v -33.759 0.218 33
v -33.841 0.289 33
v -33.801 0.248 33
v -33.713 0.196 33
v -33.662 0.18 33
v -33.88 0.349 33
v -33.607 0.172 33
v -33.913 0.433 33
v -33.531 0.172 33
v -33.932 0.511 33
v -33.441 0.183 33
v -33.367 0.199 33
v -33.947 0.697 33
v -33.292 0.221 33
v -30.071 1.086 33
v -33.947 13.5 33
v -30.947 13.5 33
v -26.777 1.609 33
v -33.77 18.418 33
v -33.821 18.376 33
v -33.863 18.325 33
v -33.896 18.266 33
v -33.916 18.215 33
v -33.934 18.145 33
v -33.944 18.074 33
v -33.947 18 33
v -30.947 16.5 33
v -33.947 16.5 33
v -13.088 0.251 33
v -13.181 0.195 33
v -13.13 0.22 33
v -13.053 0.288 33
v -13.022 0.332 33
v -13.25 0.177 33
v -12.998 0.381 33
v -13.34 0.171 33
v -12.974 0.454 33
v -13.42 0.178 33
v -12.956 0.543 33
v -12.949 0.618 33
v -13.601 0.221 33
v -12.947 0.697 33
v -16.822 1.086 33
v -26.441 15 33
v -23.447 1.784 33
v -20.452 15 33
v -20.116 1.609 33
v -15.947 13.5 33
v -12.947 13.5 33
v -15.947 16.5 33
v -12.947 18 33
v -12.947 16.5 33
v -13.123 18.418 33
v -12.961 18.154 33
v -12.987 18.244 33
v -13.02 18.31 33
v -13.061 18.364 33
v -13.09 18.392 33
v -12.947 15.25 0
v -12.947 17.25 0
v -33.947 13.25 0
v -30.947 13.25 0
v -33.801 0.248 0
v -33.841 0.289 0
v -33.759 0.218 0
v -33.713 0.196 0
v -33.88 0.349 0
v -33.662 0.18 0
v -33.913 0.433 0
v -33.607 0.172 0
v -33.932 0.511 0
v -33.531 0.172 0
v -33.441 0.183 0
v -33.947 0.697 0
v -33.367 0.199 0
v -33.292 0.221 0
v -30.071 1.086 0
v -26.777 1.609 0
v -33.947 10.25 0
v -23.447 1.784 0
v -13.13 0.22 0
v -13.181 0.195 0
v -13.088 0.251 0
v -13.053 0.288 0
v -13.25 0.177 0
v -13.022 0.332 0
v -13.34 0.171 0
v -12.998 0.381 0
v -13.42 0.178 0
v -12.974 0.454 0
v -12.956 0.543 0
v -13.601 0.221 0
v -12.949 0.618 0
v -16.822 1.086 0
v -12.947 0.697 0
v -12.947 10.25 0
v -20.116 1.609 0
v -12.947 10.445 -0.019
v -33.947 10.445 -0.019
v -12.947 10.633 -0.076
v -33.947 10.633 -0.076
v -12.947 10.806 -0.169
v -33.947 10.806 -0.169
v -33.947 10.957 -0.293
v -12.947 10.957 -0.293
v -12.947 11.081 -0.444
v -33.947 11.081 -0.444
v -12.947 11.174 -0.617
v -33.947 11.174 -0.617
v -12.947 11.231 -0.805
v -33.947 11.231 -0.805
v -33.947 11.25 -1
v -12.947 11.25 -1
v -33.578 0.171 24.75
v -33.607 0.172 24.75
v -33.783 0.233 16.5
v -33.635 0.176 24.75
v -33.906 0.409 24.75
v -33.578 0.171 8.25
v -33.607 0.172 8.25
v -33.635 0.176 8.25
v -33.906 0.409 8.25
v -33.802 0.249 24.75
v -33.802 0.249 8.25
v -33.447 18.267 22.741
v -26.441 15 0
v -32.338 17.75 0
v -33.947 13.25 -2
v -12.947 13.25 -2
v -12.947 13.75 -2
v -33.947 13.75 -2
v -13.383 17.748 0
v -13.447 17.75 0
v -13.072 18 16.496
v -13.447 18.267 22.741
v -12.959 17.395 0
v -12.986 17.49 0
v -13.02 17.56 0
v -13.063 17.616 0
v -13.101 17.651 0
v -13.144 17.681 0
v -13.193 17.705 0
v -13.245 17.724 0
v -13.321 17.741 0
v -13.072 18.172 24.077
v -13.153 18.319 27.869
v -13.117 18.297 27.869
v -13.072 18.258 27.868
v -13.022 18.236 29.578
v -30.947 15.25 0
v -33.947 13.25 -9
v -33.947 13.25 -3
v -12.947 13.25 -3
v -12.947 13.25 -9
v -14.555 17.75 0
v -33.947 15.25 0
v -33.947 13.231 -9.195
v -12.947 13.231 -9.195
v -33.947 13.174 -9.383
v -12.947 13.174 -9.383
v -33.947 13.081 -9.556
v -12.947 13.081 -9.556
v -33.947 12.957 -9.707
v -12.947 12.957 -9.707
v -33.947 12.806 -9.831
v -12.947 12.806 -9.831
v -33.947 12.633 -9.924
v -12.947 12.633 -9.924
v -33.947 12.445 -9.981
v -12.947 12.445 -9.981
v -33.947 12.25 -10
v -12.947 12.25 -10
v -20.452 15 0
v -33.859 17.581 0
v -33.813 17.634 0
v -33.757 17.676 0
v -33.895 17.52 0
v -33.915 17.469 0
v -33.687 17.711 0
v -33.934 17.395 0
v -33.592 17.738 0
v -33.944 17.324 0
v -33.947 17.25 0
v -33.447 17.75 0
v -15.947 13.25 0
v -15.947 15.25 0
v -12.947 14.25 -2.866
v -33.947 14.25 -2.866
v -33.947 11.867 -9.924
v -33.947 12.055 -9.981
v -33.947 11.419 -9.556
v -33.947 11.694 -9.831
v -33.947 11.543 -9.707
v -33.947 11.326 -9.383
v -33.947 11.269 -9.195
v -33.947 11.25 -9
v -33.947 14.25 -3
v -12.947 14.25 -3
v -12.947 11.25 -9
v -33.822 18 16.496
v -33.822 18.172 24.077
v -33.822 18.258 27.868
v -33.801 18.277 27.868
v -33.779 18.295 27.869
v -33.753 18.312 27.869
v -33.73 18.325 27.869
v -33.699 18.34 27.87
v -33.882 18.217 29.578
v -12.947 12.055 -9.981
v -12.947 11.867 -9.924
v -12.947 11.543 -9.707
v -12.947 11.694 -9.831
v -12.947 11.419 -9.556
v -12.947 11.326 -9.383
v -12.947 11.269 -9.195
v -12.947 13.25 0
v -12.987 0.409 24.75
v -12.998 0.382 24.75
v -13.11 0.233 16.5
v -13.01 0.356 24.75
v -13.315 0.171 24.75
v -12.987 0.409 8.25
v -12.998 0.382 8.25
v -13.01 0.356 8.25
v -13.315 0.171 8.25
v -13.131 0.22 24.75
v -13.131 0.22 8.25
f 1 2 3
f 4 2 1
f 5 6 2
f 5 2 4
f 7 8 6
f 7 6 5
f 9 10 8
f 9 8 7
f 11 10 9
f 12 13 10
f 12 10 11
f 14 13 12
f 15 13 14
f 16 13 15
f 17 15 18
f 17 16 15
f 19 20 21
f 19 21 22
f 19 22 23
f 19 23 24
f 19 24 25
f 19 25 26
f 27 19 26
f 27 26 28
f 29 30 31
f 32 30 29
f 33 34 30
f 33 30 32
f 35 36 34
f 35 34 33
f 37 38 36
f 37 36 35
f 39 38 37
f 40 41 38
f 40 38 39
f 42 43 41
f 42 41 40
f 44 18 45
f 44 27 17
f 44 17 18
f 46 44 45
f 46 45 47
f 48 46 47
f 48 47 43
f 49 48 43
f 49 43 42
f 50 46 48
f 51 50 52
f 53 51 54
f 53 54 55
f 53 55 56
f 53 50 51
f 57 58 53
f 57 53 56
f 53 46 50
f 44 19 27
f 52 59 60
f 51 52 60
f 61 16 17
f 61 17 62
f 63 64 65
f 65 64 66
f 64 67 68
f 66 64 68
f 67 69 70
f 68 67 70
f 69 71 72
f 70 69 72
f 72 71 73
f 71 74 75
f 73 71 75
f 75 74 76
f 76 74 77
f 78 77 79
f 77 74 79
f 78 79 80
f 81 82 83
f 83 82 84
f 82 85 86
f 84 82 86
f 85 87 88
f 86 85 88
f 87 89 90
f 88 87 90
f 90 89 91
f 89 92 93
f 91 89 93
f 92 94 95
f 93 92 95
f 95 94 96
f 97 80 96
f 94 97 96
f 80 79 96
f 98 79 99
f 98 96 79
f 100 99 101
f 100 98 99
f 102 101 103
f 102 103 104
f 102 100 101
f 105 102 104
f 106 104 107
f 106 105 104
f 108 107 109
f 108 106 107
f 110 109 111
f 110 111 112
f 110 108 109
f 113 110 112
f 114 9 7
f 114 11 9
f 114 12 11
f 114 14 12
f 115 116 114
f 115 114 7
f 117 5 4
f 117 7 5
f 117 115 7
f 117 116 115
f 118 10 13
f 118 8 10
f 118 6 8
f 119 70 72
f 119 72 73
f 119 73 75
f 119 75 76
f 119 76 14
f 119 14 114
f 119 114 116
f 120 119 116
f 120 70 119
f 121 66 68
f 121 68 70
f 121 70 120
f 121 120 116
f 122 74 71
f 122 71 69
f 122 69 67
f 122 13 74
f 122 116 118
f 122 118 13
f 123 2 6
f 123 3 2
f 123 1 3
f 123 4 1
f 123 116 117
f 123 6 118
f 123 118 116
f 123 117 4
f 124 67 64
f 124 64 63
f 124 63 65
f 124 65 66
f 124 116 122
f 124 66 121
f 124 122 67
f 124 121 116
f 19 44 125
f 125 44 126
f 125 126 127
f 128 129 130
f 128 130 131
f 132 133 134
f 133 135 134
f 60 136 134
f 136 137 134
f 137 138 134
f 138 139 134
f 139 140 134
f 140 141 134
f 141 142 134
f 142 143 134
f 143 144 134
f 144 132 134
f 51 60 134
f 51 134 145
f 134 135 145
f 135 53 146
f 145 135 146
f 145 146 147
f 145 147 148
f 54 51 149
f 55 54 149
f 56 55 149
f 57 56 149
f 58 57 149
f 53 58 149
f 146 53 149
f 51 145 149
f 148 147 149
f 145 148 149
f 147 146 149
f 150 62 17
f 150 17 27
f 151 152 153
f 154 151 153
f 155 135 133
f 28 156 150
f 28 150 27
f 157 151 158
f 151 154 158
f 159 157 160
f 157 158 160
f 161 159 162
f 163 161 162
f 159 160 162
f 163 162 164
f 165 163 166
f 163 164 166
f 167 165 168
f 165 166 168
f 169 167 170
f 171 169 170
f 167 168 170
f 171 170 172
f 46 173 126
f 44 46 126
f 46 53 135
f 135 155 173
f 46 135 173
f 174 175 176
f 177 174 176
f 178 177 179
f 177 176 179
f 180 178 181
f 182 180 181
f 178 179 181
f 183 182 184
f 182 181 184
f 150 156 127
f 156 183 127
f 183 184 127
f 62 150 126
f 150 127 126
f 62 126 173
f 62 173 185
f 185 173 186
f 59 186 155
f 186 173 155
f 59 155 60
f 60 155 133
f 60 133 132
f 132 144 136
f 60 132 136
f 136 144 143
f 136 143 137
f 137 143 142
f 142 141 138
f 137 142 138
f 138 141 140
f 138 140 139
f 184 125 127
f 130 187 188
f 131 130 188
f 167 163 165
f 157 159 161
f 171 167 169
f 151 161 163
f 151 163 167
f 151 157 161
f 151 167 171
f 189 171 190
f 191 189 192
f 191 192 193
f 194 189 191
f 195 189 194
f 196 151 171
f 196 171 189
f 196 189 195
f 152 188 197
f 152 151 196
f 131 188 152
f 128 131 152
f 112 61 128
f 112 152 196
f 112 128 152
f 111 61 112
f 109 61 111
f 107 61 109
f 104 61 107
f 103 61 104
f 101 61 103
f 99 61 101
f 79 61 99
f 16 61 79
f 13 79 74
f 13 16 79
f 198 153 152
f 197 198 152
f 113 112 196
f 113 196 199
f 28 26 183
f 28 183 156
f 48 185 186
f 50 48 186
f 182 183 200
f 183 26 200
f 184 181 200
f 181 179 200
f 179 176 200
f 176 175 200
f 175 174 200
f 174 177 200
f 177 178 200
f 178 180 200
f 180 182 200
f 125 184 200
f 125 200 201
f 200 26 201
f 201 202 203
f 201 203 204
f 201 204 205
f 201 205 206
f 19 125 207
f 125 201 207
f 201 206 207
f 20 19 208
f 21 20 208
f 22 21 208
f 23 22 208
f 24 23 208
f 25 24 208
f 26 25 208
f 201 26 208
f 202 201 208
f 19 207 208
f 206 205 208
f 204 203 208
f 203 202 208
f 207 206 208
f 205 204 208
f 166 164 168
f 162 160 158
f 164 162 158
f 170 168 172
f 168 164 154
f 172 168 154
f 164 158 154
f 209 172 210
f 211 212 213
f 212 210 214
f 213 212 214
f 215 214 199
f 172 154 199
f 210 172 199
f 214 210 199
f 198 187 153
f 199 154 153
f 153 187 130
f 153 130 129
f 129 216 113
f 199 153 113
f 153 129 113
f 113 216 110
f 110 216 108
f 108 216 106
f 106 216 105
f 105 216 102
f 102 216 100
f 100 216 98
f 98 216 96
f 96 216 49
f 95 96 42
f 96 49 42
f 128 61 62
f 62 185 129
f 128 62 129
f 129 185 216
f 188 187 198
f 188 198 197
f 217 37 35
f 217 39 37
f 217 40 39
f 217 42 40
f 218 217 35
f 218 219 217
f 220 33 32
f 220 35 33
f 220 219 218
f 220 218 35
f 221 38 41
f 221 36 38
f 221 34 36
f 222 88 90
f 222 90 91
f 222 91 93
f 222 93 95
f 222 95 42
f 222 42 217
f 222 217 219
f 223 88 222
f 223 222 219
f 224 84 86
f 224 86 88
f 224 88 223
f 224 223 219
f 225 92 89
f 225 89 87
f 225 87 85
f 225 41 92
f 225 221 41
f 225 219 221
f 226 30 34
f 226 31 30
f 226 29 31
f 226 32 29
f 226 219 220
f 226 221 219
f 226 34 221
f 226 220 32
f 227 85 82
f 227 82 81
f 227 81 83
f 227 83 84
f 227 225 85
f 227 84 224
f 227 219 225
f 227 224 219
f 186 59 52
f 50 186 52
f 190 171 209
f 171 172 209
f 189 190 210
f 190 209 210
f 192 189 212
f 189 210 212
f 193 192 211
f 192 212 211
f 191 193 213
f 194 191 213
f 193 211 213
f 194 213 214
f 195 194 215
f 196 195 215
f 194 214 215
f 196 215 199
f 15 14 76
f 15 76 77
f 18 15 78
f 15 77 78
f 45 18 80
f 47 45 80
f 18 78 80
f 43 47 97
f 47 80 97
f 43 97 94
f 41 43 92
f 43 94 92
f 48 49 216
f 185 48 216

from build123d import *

# Parameters (mm, degrees)
F1_DEPTH    = 33
F3_DEPTH    = 21.001
F4_DEPTH    = 3
F6_T1_DEPTH = 35.508521627
F6_T3_DEPTH = 36.4826554363
F7_W        = 21
F7_H        = 2
F8_DEPTH    = 10
F9_W        = 21
F9_H        = 1
F10_DEPTH   = 1
F11_SIZE2   = 0.8660254038
F11_SIZE    = 0.5
F12_R       = 0.99999


# Not quite as in the source:
# - a fillet or chamfer that OpenCascade refuses, or shapes differently, is made with other operations: its cross-section is extruded or revolved along the edge and cut away or added
# - a fillet or chamfer is up to 0.001 mm smaller than in the source, because OpenCascade refuses the exact size
# - a pattern or mirror of a feature is missing from the dataset's text; its kind, count and spacing are read off the source's solid


with BuildPart() as f1:
    # F0 (on Top) → F1 (new body)
    with BuildSketch(Plane.XY):
        Polygon((-33.9465141296, 18.5), (-33.9465141296, 15), (-26.4407399079, 15), align=None)
        Polygon((-20.4522883514, 15), (-12.9465141296, 15), (-12.9465141296, 18.5), align=None)
        with BuildLine():
            Line((-33.9465141296, 15), (-33.9465141296, 0))
            ThreePointArc((-33.9465141296, 0), (-23.4465141296, 1.783504535), (-12.9465141296, 0))
            Line((-12.9465141296, 0), (-12.9465141296, 15))
            Line((-12.9465141296, 15), (-20.4522883514, 15))
            Line((-20.4522883514, 15), (-26.4407399079, 15))
            Line((-26.4407399079, 15), (-33.9465141296, 15))
        make_face()
    extrude(amount=F1_DEPTH)

    # F2 (on face) → F3 (cut, through all)
    with BuildSketch(Plane.YZ.offset(-12.9465141296)):
        Polygon((18.5, 0), (18.5, 33), (17.75, 0), align=None)
    extrude(amount=-F3_DEPTH, mode=Mode.SUBTRACT)

    # F2 (on face) → F4 (cut)
    with BuildSketch(Plane.YZ.offset(-12.9465141296)):
        Polygon((15.25, 0), (16.5, 33), (13.5, 33), (13.25, 0), align=None)
    f4 = extrude(amount=-F4_DEPTH, mode=Mode.SUBTRACT)

    # F4_copies: F4 across plane
    add(f4.mirror(Plane(origin=(-23.446514, 0, 0), x_dir=(0, 0, -1), z_dir=(-1, 0, 0))), mode=Mode.SUBTRACT)

    # F6: fillet of radius 0.5 on 4 edges, made by hand

    # F6_s2 → F6_t1 (cut)
    with BuildSketch(Plane(origin=(0, 0.7875654118, 34.6528781205), x_dir=(1, 0, 0), z_dir=(0, -0.0227214054, -0.9997418355))):
        with BuildLine():
            add(Edge.make_bspline(
                [(-13.4465141296, -17.7454175809), (-12.9465141296, -17.7454175809), (-12.9465141296, -17.2454175809)],
                knots=[0, 0, 0, 1, 1, 1], degree=2, weights=[1, 1, 1]))
            Line((-12.9465141296, -17.2454175809), (-12.9465141296, -17.7454175809))
            Line((-12.9465141296, -17.7454175809), (-13.4465141296, -17.7454175809))
        make_face()
        with BuildLine():
            add(Edge.make_bspline(
                [(-33.9465141296, -17.2454175809), (-33.9465141296, -17.7454175809), (-33.4465141296, -17.7454175809)],
                knots=[0, 0, 0, 1, 1, 1], degree=2, weights=[1, 1, 1]))
            Line((-33.4465141296, -17.7454175809), (-33.9465141296, -17.7454175809))
            Line((-33.9465141296, -17.7454175809), (-33.9465141296, -17.2454175809))
        make_face()
    extrude(amount=F6_T1_DEPTH, mode=Mode.SUBTRACT)

    # F6_s4 → F6_t3 (cut)
    with BuildSketch(Plane.XY.offset(-1.7413277182)):
        with BuildLine():
            add(Edge.make_bspline(
                [(-33.291715368, 0.2210972397), (-33.9465141296, 0.0078982049), (-33.9465141296, 0.6965310873)],
                knots=[0, 0, 0, 1, 1, 1], degree=2, weights=[1, 1, 1]))
            Line((-33.9465141296, 0.6965310873), (-33.9465141296, 0))
            ThreePointArc((-33.9465141296, 0), (-33.6197154132, 0.1123275396), (-33.291715368, 0.2210972397))
        make_face()
        with BuildLine():
            add(Edge.make_bspline(
                [(-12.9465141296, 0.6965310873), (-12.9465141296, 0.0078982049), (-13.6013128912, 0.2210972397)],
                knots=[0, 0, 0, 1, 1, 1], degree=2, weights=[1, 1, 1]))
            ThreePointArc((-13.6013128912, 0.2210972397), (-13.2733128461, 0.1123275396), (-12.9465141296, 0))
            Line((-12.9465141296, 0), (-12.9465141296, 0.6965310873))
        make_face()
    extrude(amount=F6_T3_DEPTH, mode=Mode.SUBTRACT)

    # F7 (on face) → F8 (join)
    with BuildSketch(Plane(origin=(0, 0, 0), x_dir=(1, 0, 0), z_dir=(0, 0, -1))):
        with Locations((-23.4465141296, -12.25)):
            Rectangle(F7_W, F7_H)
    extrude(amount=F8_DEPTH)

    # F9 (on face) → F10 (join)
    with BuildSketch(Plane(origin=(0, 13.25, 0), x_dir=(-1, 0, 0), z_dir=(0, 1, 0))):
        with Locations((23.4465141296, -2.5)):
            Rectangle(F9_W, F9_H)
    extrude(amount=F10_DEPTH)

    # F11
    f11_edges = [f1.edges().sort_by_distance(p)[0] for p in [
        (-23.446514, 14.25, -2),
    ]]
    f11_side = f1.faces().sort_by_distance((-23.446514, 13.75, -2))[0]
    chamfer(f11_edges, length=F11_SIZE, length2=F11_SIZE2, reference=f11_side)

    # F12 (radius 1 in the source; OpenCascade refuses exactly that, so slightly less here)
    f12_edges = [f1.edges().sort_by_distance(p)[0] for p in [
        (-23.446514, 11.25, 0),
        (-23.446514, 13.25, -10),
        (-23.446514, 11.25, -10),
    ]]
    fillet(f12_edges, radius=F12_R)


solid = f1.part
